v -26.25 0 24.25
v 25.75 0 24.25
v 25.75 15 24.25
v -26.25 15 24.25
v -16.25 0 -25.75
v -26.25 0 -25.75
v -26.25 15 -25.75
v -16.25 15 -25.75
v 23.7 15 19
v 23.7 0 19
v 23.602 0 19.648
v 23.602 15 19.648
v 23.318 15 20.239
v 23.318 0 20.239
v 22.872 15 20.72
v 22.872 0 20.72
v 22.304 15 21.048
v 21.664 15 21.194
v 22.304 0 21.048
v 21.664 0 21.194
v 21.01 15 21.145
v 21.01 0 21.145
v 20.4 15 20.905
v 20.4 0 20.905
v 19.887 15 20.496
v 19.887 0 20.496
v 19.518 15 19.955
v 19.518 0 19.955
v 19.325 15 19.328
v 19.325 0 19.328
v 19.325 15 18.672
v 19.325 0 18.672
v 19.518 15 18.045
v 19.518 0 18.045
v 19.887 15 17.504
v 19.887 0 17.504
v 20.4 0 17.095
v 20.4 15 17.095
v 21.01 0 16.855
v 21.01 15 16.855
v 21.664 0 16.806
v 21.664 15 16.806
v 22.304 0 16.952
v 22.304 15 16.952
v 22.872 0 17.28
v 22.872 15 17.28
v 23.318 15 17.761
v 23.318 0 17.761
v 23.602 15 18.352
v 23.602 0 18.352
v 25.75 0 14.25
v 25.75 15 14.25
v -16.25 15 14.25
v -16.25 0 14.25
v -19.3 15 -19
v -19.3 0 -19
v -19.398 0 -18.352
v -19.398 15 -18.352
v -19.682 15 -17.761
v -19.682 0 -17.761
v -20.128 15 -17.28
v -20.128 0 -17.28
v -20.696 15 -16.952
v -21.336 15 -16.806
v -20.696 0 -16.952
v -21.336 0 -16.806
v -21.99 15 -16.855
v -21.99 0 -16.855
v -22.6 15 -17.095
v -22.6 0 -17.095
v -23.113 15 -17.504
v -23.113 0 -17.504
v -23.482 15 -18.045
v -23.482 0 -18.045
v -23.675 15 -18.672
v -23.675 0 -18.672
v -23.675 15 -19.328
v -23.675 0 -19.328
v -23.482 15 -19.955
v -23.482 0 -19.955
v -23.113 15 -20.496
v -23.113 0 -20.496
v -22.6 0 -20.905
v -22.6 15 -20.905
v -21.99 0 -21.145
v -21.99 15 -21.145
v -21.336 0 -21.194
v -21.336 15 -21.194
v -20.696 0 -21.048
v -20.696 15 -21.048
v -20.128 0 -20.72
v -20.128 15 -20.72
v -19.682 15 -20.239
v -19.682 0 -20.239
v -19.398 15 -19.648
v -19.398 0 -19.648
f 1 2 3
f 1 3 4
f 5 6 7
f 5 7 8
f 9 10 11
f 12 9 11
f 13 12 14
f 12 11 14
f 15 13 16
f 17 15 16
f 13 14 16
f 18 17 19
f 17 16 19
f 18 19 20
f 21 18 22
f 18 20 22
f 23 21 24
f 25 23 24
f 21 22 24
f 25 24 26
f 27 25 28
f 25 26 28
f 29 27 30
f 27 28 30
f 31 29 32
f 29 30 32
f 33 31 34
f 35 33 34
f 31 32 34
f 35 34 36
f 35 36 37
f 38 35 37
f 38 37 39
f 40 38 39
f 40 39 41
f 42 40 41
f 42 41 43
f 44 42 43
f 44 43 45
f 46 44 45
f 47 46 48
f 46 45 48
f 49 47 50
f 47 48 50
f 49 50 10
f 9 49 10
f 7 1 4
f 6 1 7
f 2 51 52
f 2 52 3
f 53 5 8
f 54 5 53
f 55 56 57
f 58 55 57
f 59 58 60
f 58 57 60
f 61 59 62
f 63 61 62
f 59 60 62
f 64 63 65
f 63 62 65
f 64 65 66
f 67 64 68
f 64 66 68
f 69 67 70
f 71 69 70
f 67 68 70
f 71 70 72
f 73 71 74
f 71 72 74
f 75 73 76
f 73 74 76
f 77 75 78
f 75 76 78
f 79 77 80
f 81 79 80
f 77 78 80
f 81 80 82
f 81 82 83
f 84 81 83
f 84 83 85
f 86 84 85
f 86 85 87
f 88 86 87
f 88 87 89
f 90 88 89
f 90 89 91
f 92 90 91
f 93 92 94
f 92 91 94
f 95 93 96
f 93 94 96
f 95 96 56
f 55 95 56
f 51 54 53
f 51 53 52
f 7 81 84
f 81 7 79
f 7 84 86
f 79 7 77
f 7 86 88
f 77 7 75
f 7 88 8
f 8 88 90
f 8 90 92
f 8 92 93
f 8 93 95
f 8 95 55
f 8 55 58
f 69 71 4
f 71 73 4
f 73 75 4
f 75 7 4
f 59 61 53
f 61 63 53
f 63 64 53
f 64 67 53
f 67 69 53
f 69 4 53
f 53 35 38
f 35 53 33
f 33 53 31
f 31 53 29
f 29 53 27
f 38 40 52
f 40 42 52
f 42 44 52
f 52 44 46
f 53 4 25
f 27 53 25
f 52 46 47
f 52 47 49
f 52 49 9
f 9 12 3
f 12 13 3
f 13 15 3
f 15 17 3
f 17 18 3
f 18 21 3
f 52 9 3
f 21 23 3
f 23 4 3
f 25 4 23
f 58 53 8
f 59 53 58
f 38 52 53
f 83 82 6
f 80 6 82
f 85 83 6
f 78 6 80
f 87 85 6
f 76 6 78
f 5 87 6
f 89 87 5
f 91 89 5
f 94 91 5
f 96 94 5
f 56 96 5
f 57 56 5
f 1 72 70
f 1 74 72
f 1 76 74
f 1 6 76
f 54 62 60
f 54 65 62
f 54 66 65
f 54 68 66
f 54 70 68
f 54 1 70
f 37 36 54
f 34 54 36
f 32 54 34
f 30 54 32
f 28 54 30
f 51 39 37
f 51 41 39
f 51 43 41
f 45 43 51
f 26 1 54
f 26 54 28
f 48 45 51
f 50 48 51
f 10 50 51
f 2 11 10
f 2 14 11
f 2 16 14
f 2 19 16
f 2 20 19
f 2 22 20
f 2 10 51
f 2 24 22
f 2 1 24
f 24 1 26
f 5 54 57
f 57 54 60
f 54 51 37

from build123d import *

# Parameters (mm, degrees)
F0_R     = 2.2
F1_DEPTH = 15
F2_R     = 2.2
F3_DEPTH = 15


with BuildPart() as f1:
    # F0 (on Front) → F1 (new body)
    with BuildSketch(Plane.XZ):
        with BuildLine():
            Line((8.592964, -25.75), (25.75, -25.75))
            Line((25.75, -25.75), (25.75, 0))
            ThreePointArc((25.75, 0), (24.573215, 7.695427), (21.150419, 14.687487))
            Line((21.150419, 14.687487), (23.486593, 16.752013))
            ThreePointArc((23.486593, 16.752013), (23.747987, 20.986593), (19.513407, 21.247987))
            Line((19.513407, 21.247987), (17.177232, 19.183461))
            ThreePointArc((17.177232, 19.183461), (-10.505921, 23.50932), (-25.75, 0))
            ThreePointArc((-25.75, 0), (-24.545164, -7.667474), (-21.046787, -14.595905))
            Line((-21.046787, -14.595905), (-23.486593, -16.752013))
            ThreePointArc((-23.486593, -16.752013), (-23.747987, -20.986593), (-19.513407, -21.247987))
            Line((-19.513407, -21.247987), (-16.983615, -19.012358))
            ThreePointArc((-16.983615, -19.012358), (-4.7787, -24.673256), (8.592964, -23.188554))
            Line((8.592964, -23.188554), (8.592964, -25.75))
        make_face()
        with Locations((-21.5, -19)):
            Circle(F0_R, mode=Mode.SUBTRACT)
        with Locations((21.5, 19)):
            Circle(F0_R, mode=Mode.SUBTRACT)
    extrude(amount=F1_DEPTH)


with BuildPart() as f3:
    # F2 (on Front) → F3 (new body)
    with BuildSketch(Plane.XZ):
        Polygon((25.75, 14.25), (25.75, 24.25), (-26.25, 24.25), (-26.25, -25.75), (-16.25, -25.75), (-16.25, 14.25), align=None)
        with Locations((-21.5, -19)):
            Circle(F2_R, mode=Mode.SUBTRACT)
        with Locations((21.5, 19)):
            Circle(F2_R, mode=Mode.SUBTRACT)
    extrude(amount=-F3_DEPTH)


solid = f3.part
